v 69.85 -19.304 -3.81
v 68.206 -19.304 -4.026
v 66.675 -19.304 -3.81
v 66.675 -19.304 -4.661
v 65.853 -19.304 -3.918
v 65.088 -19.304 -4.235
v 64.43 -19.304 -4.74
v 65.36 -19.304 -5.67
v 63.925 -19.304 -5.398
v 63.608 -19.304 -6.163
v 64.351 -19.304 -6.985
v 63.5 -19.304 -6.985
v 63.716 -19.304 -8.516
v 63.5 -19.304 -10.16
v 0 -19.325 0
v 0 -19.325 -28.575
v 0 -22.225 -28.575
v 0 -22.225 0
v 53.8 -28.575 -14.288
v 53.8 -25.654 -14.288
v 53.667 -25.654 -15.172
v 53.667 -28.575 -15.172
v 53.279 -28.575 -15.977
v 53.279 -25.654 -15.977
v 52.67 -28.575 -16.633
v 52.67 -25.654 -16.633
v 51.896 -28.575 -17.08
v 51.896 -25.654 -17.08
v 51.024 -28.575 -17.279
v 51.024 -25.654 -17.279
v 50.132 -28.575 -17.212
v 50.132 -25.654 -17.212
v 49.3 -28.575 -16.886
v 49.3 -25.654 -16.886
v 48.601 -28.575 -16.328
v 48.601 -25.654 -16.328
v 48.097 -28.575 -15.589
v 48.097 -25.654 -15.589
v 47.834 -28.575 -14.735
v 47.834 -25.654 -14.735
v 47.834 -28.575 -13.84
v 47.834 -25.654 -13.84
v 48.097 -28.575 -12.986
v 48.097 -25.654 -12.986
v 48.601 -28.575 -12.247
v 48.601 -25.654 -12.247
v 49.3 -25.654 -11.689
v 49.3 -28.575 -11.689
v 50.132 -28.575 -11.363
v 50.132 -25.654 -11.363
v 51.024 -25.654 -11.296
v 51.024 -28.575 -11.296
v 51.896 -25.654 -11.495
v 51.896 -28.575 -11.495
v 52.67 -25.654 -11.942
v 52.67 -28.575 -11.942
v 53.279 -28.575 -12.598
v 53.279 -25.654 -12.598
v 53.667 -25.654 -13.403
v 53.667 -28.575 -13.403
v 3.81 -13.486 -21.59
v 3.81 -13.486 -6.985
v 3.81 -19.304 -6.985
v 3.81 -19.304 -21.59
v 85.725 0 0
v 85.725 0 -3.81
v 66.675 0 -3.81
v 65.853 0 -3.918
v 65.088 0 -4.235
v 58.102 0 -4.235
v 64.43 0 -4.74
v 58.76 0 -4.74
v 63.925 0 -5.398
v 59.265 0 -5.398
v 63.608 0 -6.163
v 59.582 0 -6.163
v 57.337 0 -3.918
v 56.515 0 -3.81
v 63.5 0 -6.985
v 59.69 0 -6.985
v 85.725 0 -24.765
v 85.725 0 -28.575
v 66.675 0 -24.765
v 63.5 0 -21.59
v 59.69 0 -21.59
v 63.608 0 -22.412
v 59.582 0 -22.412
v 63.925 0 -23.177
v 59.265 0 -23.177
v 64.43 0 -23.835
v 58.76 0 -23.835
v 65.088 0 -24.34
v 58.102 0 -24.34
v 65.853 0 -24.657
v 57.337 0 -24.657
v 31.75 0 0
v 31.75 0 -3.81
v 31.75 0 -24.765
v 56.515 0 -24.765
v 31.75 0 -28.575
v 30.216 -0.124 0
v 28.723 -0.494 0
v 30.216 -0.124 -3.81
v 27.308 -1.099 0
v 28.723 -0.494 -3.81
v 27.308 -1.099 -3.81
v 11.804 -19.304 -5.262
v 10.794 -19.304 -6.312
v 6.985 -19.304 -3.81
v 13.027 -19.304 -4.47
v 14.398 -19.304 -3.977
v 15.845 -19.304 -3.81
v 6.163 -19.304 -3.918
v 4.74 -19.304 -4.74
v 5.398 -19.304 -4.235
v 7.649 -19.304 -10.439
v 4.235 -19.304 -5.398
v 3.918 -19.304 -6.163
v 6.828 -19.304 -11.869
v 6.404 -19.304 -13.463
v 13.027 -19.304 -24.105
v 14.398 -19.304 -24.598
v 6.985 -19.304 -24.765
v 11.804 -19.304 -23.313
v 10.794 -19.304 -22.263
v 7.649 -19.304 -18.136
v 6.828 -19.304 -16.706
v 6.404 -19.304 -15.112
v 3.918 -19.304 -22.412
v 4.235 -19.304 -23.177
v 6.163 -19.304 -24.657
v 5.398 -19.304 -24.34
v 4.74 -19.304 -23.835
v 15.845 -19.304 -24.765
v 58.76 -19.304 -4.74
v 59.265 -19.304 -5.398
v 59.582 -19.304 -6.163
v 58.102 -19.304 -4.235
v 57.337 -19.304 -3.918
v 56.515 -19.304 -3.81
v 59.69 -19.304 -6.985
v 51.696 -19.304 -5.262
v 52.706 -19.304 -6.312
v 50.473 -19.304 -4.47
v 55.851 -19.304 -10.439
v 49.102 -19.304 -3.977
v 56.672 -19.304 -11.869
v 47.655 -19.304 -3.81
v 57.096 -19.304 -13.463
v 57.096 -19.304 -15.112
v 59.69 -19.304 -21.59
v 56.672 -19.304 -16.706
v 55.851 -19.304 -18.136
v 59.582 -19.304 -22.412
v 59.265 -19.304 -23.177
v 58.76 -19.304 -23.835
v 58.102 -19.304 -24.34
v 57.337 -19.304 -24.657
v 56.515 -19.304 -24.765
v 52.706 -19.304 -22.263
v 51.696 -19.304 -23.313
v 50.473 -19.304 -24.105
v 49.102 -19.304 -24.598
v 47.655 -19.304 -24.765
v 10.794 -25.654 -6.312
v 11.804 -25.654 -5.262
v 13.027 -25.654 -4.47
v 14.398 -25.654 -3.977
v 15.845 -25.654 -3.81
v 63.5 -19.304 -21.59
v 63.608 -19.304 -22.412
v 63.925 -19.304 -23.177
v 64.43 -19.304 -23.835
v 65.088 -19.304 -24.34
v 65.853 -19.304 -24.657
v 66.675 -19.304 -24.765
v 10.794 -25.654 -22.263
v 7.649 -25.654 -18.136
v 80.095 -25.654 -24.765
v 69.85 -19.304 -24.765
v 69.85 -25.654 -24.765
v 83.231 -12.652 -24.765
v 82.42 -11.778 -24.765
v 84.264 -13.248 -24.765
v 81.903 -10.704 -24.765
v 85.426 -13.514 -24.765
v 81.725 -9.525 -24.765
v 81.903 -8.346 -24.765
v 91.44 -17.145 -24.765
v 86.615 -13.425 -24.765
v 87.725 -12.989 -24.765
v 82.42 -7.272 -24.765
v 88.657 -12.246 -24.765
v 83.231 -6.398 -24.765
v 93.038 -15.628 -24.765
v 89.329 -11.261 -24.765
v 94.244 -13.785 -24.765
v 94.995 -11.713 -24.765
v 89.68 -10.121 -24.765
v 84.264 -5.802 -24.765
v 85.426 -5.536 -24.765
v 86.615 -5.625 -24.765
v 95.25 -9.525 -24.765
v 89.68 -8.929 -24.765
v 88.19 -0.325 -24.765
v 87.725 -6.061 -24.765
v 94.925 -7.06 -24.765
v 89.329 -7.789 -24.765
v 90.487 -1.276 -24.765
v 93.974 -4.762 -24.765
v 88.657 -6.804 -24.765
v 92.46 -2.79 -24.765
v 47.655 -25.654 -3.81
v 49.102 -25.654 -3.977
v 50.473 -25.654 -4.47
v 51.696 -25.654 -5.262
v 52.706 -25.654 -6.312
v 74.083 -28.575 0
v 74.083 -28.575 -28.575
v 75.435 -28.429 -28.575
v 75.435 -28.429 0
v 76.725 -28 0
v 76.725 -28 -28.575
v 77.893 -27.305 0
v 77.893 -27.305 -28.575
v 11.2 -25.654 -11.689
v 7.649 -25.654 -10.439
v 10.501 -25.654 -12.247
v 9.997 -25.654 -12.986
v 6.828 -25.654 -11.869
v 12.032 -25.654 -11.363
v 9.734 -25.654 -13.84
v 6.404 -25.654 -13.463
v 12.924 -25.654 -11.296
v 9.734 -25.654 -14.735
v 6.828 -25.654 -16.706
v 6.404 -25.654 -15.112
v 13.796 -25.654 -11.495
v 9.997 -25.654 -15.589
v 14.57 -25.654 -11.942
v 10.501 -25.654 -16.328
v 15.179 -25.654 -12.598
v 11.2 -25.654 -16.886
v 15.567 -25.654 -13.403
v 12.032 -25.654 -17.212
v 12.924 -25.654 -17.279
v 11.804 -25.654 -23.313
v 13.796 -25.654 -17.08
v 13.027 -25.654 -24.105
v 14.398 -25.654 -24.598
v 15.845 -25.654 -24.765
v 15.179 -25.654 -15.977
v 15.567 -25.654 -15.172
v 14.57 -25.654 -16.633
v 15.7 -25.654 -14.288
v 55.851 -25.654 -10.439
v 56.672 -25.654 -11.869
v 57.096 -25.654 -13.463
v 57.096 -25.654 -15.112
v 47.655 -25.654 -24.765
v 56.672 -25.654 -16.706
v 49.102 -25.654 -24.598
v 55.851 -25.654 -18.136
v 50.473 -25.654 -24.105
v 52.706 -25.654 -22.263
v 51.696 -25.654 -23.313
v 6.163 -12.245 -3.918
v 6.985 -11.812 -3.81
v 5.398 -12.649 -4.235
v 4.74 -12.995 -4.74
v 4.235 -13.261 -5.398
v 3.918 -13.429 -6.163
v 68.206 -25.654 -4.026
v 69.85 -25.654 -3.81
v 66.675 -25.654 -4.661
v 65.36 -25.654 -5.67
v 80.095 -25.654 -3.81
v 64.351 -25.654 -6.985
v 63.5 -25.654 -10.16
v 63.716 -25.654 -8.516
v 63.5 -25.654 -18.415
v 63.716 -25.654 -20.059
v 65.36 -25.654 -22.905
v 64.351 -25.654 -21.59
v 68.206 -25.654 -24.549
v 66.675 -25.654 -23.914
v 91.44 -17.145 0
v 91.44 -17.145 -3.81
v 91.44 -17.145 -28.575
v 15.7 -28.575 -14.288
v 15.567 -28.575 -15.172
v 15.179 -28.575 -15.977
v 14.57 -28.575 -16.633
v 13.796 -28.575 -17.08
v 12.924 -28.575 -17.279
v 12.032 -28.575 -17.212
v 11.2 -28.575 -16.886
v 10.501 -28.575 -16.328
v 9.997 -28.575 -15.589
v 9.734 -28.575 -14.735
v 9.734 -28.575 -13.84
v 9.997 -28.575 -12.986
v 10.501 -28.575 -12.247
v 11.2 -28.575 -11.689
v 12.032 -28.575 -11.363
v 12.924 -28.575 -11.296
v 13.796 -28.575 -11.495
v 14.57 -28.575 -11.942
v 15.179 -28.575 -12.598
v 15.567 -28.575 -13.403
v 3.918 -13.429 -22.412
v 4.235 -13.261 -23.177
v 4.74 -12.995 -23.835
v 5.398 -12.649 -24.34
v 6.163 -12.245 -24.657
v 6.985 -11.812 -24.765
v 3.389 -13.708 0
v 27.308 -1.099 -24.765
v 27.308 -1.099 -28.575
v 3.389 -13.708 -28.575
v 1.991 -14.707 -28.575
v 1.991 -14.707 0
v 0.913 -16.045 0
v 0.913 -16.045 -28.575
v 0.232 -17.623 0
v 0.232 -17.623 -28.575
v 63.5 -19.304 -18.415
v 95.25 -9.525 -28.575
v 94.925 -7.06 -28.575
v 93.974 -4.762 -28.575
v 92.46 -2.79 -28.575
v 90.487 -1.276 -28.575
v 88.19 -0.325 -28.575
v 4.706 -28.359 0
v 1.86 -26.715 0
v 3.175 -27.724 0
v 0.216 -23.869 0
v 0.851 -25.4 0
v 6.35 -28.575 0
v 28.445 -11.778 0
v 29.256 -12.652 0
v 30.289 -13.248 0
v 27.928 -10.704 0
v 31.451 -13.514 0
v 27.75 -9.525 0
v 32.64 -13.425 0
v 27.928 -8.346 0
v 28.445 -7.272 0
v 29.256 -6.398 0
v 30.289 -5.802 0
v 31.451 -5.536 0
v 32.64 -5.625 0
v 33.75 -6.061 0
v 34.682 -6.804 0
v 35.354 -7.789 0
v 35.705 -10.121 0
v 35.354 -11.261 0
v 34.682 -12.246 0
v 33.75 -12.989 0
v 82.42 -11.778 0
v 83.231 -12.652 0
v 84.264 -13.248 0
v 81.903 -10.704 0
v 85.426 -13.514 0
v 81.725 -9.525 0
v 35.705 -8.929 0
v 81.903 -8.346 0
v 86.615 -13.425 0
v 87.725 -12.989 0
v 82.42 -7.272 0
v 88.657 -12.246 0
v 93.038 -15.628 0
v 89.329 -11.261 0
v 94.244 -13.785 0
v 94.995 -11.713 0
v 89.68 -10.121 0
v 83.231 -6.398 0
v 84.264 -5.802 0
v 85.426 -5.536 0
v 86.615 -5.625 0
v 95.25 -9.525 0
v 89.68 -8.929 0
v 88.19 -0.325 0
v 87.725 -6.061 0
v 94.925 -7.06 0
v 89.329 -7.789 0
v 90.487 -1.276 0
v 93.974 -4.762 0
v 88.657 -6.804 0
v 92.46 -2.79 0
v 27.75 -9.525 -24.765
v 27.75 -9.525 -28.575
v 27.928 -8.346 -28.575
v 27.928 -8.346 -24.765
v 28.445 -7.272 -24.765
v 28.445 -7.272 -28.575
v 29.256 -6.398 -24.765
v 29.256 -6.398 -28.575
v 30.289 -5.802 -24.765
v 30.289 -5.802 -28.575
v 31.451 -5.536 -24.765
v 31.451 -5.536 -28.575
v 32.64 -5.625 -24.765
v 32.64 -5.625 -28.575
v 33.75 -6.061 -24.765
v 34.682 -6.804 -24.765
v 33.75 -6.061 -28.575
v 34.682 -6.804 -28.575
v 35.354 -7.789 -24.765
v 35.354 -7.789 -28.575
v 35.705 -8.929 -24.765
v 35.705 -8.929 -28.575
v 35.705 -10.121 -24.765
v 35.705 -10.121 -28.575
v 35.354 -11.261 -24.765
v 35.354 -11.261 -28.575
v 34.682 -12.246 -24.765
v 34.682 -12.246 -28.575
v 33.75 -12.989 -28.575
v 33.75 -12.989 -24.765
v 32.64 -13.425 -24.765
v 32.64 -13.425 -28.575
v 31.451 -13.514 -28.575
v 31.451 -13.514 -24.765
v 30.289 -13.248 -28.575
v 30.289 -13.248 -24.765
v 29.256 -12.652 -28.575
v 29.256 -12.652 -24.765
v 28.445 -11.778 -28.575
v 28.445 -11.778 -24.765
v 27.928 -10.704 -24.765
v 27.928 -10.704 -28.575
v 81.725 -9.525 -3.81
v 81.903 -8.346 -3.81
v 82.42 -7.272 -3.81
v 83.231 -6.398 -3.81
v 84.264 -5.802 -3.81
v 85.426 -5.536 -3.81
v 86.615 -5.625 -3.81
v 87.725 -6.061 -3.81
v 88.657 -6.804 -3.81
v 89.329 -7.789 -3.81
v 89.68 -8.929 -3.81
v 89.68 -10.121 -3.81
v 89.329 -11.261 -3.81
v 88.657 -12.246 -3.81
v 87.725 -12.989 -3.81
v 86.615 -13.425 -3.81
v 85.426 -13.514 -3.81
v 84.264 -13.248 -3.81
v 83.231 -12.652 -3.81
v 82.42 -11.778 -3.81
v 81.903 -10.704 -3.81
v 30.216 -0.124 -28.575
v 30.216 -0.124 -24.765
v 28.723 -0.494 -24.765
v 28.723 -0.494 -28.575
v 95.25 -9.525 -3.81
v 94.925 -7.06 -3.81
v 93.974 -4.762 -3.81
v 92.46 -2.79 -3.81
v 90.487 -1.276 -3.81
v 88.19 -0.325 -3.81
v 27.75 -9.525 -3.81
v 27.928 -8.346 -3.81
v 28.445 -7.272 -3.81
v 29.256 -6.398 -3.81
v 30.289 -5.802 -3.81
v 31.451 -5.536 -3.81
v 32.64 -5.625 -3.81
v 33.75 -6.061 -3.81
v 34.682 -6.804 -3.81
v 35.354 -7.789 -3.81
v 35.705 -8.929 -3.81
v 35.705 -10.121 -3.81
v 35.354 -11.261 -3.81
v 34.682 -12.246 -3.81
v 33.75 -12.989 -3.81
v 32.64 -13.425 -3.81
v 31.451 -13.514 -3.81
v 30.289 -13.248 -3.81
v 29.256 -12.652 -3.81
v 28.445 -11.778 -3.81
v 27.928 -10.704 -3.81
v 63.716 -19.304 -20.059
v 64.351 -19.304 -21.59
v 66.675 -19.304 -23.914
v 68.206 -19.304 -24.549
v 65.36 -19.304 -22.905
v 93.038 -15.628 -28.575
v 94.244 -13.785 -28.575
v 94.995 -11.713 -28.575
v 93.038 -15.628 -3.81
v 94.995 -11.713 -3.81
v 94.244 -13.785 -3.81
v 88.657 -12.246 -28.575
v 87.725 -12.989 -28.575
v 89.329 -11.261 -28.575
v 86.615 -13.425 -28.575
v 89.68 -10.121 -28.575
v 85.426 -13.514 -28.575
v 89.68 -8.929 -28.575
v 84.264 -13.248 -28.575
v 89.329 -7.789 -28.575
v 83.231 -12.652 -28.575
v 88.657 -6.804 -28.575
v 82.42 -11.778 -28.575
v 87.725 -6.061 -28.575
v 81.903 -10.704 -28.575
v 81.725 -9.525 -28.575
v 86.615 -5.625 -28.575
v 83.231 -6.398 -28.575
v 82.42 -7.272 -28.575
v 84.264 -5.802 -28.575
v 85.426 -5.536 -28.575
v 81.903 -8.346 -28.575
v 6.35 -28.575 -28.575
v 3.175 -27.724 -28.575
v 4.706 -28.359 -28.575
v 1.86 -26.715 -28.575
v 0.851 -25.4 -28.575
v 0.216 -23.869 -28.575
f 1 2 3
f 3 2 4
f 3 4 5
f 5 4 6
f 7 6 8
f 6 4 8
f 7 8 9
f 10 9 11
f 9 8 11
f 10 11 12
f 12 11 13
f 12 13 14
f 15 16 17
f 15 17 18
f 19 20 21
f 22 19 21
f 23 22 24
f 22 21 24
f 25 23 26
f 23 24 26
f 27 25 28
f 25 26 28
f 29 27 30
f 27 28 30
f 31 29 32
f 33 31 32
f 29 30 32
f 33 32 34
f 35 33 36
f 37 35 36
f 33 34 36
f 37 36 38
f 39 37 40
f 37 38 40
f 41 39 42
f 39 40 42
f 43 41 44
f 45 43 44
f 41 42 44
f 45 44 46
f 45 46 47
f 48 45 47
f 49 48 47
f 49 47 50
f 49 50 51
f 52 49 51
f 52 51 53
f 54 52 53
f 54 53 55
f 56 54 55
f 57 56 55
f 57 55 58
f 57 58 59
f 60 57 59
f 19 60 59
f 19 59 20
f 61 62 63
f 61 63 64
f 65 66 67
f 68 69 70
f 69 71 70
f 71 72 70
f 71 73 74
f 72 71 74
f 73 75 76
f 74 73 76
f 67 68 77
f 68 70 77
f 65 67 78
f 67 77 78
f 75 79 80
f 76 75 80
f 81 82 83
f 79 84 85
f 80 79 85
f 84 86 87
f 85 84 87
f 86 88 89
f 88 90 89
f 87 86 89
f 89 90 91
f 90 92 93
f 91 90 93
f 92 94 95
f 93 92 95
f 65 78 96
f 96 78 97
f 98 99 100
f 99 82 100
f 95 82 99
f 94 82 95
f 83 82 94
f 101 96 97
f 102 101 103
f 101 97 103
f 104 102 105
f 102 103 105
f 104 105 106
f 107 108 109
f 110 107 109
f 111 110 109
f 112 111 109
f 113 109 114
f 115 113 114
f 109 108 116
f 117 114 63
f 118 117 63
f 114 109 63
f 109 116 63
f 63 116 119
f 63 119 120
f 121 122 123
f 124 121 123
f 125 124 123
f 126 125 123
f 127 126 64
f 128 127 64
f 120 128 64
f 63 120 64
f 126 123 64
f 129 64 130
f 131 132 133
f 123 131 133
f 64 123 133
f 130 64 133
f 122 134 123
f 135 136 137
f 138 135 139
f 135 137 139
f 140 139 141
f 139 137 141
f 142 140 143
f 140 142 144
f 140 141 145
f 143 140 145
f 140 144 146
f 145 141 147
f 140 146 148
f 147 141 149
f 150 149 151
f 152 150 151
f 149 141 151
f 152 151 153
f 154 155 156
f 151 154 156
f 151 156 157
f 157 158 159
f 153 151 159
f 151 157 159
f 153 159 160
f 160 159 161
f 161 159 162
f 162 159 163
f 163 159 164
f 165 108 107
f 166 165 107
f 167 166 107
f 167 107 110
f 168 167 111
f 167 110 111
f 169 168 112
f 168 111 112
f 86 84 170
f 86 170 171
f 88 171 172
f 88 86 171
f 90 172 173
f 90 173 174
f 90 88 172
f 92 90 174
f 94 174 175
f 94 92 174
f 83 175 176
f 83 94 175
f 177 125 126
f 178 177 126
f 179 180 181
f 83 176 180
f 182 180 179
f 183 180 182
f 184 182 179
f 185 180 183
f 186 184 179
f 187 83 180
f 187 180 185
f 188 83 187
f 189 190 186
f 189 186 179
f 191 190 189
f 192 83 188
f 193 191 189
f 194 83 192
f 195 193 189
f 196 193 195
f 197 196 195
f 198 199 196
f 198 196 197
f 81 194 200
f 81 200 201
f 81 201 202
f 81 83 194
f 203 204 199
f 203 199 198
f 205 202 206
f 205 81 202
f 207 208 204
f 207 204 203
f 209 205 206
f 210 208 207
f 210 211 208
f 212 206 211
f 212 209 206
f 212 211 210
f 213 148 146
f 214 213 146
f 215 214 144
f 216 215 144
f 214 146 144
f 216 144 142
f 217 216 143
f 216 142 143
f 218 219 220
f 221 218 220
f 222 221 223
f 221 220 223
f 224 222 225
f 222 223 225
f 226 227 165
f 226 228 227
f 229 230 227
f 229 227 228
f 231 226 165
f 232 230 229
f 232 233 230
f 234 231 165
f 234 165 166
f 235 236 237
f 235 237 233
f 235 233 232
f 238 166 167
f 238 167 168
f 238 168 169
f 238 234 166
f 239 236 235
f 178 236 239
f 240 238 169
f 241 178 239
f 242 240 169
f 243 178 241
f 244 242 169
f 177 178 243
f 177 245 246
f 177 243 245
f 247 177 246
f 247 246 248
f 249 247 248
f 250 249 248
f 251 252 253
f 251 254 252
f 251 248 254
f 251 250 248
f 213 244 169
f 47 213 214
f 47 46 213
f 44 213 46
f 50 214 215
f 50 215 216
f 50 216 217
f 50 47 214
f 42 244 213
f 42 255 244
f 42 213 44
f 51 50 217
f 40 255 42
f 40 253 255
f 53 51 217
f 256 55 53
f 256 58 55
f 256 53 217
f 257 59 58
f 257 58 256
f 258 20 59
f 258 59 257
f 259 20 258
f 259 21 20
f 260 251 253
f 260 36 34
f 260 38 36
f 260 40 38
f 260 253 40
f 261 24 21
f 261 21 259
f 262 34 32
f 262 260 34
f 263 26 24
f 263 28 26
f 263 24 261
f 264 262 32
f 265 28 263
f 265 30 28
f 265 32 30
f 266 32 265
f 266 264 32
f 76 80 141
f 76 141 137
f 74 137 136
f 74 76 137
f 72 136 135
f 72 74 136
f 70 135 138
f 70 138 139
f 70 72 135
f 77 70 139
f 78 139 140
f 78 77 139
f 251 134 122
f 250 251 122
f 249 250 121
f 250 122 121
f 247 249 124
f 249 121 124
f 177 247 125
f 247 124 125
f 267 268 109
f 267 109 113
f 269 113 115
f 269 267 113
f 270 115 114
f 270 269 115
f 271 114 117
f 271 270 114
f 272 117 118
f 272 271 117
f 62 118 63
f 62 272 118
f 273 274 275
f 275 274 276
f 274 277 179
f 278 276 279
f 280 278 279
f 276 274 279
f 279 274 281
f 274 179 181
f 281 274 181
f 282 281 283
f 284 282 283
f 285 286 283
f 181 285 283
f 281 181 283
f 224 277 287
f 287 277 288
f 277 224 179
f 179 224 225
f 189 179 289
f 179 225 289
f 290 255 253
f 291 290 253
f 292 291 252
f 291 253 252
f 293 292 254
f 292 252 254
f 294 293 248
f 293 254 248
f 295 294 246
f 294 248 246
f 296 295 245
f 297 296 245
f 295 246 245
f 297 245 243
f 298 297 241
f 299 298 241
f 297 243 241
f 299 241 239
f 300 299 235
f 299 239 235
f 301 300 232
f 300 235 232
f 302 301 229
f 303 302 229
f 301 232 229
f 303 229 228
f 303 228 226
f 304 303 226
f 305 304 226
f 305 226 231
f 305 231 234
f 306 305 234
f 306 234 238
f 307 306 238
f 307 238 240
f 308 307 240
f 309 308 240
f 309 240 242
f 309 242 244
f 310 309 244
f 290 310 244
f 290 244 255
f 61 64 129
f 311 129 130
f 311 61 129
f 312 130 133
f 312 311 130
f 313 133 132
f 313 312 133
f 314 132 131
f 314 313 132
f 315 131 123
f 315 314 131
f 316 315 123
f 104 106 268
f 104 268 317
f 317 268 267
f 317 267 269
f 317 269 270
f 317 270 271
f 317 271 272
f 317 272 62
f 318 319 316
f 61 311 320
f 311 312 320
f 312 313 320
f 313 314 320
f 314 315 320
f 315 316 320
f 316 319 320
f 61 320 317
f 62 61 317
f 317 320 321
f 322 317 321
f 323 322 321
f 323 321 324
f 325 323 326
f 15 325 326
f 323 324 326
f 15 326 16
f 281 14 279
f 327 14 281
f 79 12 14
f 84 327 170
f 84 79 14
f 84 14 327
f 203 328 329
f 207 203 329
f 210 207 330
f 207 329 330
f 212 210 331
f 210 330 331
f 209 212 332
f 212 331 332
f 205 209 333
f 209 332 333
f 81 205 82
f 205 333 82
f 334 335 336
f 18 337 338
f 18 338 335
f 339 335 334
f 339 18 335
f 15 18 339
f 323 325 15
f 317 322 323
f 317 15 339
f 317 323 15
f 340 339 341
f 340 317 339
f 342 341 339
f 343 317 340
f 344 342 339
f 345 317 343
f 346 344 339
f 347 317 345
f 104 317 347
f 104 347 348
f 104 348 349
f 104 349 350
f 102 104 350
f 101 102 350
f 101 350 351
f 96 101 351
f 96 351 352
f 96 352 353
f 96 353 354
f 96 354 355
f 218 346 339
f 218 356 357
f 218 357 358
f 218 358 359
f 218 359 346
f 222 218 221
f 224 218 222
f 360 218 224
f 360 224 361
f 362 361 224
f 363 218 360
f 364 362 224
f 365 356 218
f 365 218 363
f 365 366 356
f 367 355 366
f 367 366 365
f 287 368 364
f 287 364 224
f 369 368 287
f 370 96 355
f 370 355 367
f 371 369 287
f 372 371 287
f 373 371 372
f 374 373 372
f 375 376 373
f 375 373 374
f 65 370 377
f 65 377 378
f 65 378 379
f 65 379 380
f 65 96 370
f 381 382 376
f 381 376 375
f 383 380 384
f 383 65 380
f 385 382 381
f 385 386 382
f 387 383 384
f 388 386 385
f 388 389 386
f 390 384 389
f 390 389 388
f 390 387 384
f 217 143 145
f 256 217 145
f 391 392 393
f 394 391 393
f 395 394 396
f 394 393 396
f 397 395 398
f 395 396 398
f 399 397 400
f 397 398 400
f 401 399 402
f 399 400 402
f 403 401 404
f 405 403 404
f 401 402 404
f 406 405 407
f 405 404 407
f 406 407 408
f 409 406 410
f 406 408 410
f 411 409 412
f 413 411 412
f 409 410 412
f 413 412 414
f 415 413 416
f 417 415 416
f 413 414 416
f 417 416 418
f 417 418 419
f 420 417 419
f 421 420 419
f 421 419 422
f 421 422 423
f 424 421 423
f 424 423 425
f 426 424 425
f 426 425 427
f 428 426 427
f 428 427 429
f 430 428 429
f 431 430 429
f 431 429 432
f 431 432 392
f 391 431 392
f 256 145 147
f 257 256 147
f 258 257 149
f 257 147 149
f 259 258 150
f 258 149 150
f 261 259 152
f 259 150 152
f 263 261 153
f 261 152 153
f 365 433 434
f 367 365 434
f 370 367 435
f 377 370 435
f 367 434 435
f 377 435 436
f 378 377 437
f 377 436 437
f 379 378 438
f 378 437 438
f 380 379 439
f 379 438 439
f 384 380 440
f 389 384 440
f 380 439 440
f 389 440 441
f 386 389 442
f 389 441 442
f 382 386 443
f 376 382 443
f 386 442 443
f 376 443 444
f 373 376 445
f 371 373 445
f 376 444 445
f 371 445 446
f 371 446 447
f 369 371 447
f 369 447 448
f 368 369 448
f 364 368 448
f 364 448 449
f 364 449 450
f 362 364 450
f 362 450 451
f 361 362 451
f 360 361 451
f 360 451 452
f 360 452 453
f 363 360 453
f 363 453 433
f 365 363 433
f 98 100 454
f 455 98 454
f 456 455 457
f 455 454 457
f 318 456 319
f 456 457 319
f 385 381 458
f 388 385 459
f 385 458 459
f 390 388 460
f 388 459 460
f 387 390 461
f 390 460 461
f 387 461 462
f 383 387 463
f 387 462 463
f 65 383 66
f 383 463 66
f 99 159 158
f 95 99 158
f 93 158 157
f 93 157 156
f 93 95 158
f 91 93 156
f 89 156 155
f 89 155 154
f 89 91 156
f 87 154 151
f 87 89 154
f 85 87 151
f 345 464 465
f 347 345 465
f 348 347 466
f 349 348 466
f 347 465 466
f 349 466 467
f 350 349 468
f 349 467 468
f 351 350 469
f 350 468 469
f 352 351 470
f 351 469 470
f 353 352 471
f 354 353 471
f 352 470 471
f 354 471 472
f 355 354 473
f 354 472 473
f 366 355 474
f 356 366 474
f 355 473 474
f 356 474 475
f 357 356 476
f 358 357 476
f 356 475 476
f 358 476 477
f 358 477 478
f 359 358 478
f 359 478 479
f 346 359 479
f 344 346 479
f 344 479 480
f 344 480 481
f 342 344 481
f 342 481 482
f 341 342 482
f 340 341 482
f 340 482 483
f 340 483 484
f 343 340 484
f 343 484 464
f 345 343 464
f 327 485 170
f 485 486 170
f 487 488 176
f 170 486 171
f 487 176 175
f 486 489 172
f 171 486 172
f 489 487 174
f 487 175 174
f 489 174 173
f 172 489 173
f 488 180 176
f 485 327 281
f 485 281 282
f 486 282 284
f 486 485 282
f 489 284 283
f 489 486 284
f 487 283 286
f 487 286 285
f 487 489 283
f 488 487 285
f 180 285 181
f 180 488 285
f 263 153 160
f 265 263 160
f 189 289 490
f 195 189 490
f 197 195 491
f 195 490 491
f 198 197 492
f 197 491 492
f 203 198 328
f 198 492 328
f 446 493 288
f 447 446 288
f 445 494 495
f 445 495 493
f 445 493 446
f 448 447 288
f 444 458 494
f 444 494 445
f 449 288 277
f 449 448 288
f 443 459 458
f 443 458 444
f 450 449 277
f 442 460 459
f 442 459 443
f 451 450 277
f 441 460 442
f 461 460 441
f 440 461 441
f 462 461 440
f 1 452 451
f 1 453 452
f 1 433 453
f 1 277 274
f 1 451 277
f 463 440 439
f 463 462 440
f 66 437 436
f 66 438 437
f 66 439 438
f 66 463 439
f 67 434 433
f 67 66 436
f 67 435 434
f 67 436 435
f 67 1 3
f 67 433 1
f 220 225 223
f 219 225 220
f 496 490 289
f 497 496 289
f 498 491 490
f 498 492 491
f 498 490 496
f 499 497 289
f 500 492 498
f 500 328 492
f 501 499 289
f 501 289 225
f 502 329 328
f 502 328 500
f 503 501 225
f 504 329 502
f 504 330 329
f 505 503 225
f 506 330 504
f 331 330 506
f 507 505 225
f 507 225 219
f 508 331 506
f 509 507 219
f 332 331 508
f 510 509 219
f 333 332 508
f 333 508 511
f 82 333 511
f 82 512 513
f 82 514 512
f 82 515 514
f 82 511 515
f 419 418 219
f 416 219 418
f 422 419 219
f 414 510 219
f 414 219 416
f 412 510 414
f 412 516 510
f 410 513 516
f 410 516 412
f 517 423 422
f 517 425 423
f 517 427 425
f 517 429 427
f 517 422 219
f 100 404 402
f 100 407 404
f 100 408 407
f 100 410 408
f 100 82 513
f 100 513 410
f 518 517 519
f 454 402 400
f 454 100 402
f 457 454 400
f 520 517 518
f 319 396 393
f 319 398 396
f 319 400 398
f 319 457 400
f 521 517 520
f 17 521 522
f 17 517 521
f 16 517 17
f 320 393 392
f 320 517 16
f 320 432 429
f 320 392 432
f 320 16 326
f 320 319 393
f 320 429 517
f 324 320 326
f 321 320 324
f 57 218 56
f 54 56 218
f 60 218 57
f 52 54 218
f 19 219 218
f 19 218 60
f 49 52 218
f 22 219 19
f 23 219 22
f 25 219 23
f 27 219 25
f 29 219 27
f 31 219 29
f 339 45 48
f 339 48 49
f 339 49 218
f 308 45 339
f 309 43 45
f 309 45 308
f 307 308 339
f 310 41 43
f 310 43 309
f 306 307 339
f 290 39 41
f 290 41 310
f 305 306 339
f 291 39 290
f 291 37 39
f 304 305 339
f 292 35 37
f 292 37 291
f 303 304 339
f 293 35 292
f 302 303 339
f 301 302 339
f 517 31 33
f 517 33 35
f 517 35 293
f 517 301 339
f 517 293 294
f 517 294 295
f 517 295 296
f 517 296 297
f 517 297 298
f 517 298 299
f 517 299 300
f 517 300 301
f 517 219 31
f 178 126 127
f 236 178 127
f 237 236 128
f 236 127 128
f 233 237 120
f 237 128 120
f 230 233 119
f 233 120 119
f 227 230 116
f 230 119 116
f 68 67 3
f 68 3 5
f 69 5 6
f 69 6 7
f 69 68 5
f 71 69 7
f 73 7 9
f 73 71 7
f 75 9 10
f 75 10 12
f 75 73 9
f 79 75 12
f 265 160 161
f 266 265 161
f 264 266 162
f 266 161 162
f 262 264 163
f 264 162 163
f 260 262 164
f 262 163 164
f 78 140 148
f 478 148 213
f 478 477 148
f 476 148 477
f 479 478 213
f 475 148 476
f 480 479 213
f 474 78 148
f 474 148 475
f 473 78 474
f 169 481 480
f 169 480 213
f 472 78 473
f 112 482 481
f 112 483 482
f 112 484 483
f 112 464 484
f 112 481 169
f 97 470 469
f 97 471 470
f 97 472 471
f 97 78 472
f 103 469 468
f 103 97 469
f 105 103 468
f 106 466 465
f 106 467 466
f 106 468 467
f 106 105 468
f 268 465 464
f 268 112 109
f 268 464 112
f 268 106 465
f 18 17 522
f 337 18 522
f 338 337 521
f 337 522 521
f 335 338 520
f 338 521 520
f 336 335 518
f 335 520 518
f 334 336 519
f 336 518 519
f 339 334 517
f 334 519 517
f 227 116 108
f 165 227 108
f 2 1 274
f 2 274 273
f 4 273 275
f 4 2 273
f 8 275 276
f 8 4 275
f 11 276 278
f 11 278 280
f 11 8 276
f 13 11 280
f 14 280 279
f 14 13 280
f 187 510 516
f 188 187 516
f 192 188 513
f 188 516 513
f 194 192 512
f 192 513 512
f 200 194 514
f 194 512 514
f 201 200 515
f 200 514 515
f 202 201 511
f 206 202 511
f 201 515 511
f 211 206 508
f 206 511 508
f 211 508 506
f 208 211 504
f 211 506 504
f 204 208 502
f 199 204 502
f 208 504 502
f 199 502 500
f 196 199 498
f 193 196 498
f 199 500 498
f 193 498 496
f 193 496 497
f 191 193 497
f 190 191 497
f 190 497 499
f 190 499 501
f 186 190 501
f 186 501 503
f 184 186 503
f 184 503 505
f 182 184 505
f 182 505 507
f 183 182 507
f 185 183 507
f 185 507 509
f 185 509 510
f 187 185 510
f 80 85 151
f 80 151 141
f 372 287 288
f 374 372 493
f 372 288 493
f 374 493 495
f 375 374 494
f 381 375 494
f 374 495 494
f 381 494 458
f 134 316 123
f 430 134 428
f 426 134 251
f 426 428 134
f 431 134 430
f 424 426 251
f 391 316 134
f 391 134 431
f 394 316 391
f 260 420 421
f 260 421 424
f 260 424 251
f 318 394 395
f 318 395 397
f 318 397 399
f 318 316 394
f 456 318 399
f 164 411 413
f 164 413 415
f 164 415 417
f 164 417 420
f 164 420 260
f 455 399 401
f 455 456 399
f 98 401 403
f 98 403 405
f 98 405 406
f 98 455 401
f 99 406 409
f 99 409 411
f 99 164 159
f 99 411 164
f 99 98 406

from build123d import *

# Parameters (mm, degrees)
SKETCH1_R           = 3
BOSS_EXTRUDE1_DEPTH = 28.575
CUT_EXTRUDE1_DEPTH  = 19.304
SKETCH9_R           = 3
CUT_EXTRUDE7_DEPTH  = 6.35
SKETCH5_R           = 4
CUT_EXTRUDE3_DEPTH  = 28.575


with BuildPart() as part:
    # Sketch1 → Boss-Extrude1 (new body)
    with BuildSketch(Plane(origin=(0, 0, 0), x_dir=(1, 0, 0), z_dir=(0, 1, 0))):
        Polygon((0, 6.35), (0, 22.225), (0, 28.575), (6.35, 28.575), (88.9, 28.575), (95.25, 28.575), (95.25, 0), (88.9, 0), (6.35, 0), (0, 0), align=None)
        with Locations((12.7, 14.2875)):
            Circle(SKETCH1_R, mode=Mode.SUBTRACT)
        with Locations((50.8, 14.2875)):
            Circle(SKETCH1_R, mode=Mode.SUBTRACT)
    extrude(amount=-BOSS_EXTRUDE1_DEPTH)

    # Sketch2 → Cut-Extrude1 (cut)
    with BuildSketch(Plane(origin=(0, 0, 0), x_dir=(1, 0, 0), z_dir=(0, 1, 0))):
        with BuildLine():
            Line((3.81, 6.985), (3.81, 21.59))
            ThreePointArc((3.81, 21.59), (4.73993597, 23.83506403), (6.985, 24.765))
            Line((6.985, 24.765), (56.515, 24.765))
            ThreePointArc((56.515, 24.765), (58.76006403, 23.83506403), (59.69, 21.59))
            Line((59.69, 21.59), (59.69, 6.985))
            ThreePointArc((59.69, 6.985), (58.76006403, 4.73993597), (56.515, 3.81))
            Line((56.515, 3.81), (6.985, 3.81))
            ThreePointArc((6.985, 3.81), (4.73993597, 4.73993597), (3.81, 6.985))
        make_face()
        with BuildLine():
            Line((63.5, 6.985), (63.5, 21.59))
            ThreePointArc((63.5, 21.59), (64.42993597, 23.83506403), (66.675, 24.765))
            Line((66.675, 24.765), (95.25, 24.765))
            Line((95.25, 24.765), (95.25, 3.81))
            Line((95.25, 3.81), (66.675, 3.81))
            ThreePointArc((66.675, 3.81), (64.42993597, 4.73993597), (63.5, 6.985))
        make_face()
    extrude(amount=-CUT_EXTRUDE1_DEPTH, mode=Mode.SUBTRACT)

    # Sketch9 → Cut-Extrude7 (cut)
    with BuildSketch(Plane(origin=(0, -19.304, 0), x_dir=(1, 0, 0), z_dir=(0, 1, 0))):
        with BuildLine():
            Line((10.793997252, 22.263484848), (7.649092718, 18.135984848))
            ThreePointArc((7.649092718, 18.135984848), (6.35, 14.2875), (7.649092718, 10.439015152))
            Line((7.649092718, 10.439015152), (10.793997252, 6.311515152))
            ThreePointArc((10.793997252, 6.311515152), (13.026694001, 4.469640662), (15.844904534, 3.81))
            Line((15.844904534, 3.81), (47.655095466, 3.81))
            ThreePointArc((47.655095466, 3.81), (50.473305999, 4.469640662), (52.706002748, 6.311515152))
            Line((52.706002748, 6.311515152), (55.850907282, 10.439015152))
            ThreePointArc((55.850907282, 10.439015152), (57.15, 14.2875), (55.850907282, 18.135984848))
            Line((55.850907282, 18.135984848), (52.706002748, 22.263484848))
            ThreePointArc((52.706002748, 22.263484848), (50.473305999, 24.105359338), (47.655095466, 24.765))
            Line((47.655095466, 24.765), (15.844904534, 24.765))
            ThreePointArc((15.844904534, 24.765), (13.026694001, 24.105359338), (10.793997252, 22.263484848))
        make_face()
        with Locations((12.7, 14.2875)):
            Circle(SKETCH9_R, mode=Mode.SUBTRACT)
        with Locations((50.8, 14.2875)):
            Circle(SKETCH9_R, mode=Mode.SUBTRACT)
        with BuildLine():
            ThreePointArc((63.5, 18.415), (65.359871939, 22.905128061), (69.85, 24.765))
            Line((69.85, 24.765), (95.25, 24.765))
            Line((95.25, 24.765), (95.25, 3.81))
            Line((95.25, 3.81), (69.85, 3.81))
            ThreePointArc((69.85, 3.81), (65.359871939, 5.669871939), (63.5, 10.16))
            Line((63.5, 10.16), (63.5, 18.415))
        make_face()
    extrude(amount=-CUT_EXTRUDE7_DEPTH, mode=Mode.SUBTRACT)

    # Sketch5 → Cut-Extrude3 (cut)
    with BuildSketch(Plane(origin=(0, 0, -28.575), x_dir=(-1, 0, 0), z_dir=(0, 0, -1))):
        with BuildLine():
            Line((-95.25, 0), (-95.25, -9.524999828))
            ThreePointArc((-95.25, -9.524999828), (-92.46019203, -2.789807848), (-85.725, 0))
            Line((-85.725, 0), (-95.25, 0))
        make_face()
        with BuildLine():
            Line((-77.893333333, -27.305), (-91.44, -17.145))
            ThreePointArc((-91.44, -17.145), (-94.244419033, -13.78470942), (-95.25, -9.524999828))
            Line((-95.25, -9.524999828), (-95.25, -28.575))
            Line((-95.25, -28.575), (-74.083333333, -28.575))
            ThreePointArc((-74.083333333, -28.575), (-76.091379648, -28.249138943), (-77.893333333, -27.305))
        make_face()
        with BuildLine():
            ThreePointArc((-31.75, 0), (-29.462234044, -0.278825011), (-27.308407483, -1.098975973))
            Line((-27.308407483, -1.098975973), (-3.388938322, -13.707595992))
            ThreePointArc((-3.388938322, -13.707595992), (-0.912848096, -16.044719868), (0, -19.324945344))
            Line((0, -19.324945344), (0, 0))
            Line((0, 0), (-31.75, 0))
        make_face()
        with BuildLine():
            Line((0, -28.575), (0, -22.225))
            ThreePointArc((0, -22.225), (-1.859871939, -26.715128061), (-6.35, -28.575))
            Line((-6.35, -28.575), (0, -28.575))
        make_face()
        with Locations((-31.75, -9.525)):
            Circle(SKETCH5_R)
        with Locations((-85.725, -9.525)):
            Circle(SKETCH5_R)
    extrude(amount=-CUT_EXTRUDE3_DEPTH, mode=Mode.SUBTRACT)


solid = part.part
